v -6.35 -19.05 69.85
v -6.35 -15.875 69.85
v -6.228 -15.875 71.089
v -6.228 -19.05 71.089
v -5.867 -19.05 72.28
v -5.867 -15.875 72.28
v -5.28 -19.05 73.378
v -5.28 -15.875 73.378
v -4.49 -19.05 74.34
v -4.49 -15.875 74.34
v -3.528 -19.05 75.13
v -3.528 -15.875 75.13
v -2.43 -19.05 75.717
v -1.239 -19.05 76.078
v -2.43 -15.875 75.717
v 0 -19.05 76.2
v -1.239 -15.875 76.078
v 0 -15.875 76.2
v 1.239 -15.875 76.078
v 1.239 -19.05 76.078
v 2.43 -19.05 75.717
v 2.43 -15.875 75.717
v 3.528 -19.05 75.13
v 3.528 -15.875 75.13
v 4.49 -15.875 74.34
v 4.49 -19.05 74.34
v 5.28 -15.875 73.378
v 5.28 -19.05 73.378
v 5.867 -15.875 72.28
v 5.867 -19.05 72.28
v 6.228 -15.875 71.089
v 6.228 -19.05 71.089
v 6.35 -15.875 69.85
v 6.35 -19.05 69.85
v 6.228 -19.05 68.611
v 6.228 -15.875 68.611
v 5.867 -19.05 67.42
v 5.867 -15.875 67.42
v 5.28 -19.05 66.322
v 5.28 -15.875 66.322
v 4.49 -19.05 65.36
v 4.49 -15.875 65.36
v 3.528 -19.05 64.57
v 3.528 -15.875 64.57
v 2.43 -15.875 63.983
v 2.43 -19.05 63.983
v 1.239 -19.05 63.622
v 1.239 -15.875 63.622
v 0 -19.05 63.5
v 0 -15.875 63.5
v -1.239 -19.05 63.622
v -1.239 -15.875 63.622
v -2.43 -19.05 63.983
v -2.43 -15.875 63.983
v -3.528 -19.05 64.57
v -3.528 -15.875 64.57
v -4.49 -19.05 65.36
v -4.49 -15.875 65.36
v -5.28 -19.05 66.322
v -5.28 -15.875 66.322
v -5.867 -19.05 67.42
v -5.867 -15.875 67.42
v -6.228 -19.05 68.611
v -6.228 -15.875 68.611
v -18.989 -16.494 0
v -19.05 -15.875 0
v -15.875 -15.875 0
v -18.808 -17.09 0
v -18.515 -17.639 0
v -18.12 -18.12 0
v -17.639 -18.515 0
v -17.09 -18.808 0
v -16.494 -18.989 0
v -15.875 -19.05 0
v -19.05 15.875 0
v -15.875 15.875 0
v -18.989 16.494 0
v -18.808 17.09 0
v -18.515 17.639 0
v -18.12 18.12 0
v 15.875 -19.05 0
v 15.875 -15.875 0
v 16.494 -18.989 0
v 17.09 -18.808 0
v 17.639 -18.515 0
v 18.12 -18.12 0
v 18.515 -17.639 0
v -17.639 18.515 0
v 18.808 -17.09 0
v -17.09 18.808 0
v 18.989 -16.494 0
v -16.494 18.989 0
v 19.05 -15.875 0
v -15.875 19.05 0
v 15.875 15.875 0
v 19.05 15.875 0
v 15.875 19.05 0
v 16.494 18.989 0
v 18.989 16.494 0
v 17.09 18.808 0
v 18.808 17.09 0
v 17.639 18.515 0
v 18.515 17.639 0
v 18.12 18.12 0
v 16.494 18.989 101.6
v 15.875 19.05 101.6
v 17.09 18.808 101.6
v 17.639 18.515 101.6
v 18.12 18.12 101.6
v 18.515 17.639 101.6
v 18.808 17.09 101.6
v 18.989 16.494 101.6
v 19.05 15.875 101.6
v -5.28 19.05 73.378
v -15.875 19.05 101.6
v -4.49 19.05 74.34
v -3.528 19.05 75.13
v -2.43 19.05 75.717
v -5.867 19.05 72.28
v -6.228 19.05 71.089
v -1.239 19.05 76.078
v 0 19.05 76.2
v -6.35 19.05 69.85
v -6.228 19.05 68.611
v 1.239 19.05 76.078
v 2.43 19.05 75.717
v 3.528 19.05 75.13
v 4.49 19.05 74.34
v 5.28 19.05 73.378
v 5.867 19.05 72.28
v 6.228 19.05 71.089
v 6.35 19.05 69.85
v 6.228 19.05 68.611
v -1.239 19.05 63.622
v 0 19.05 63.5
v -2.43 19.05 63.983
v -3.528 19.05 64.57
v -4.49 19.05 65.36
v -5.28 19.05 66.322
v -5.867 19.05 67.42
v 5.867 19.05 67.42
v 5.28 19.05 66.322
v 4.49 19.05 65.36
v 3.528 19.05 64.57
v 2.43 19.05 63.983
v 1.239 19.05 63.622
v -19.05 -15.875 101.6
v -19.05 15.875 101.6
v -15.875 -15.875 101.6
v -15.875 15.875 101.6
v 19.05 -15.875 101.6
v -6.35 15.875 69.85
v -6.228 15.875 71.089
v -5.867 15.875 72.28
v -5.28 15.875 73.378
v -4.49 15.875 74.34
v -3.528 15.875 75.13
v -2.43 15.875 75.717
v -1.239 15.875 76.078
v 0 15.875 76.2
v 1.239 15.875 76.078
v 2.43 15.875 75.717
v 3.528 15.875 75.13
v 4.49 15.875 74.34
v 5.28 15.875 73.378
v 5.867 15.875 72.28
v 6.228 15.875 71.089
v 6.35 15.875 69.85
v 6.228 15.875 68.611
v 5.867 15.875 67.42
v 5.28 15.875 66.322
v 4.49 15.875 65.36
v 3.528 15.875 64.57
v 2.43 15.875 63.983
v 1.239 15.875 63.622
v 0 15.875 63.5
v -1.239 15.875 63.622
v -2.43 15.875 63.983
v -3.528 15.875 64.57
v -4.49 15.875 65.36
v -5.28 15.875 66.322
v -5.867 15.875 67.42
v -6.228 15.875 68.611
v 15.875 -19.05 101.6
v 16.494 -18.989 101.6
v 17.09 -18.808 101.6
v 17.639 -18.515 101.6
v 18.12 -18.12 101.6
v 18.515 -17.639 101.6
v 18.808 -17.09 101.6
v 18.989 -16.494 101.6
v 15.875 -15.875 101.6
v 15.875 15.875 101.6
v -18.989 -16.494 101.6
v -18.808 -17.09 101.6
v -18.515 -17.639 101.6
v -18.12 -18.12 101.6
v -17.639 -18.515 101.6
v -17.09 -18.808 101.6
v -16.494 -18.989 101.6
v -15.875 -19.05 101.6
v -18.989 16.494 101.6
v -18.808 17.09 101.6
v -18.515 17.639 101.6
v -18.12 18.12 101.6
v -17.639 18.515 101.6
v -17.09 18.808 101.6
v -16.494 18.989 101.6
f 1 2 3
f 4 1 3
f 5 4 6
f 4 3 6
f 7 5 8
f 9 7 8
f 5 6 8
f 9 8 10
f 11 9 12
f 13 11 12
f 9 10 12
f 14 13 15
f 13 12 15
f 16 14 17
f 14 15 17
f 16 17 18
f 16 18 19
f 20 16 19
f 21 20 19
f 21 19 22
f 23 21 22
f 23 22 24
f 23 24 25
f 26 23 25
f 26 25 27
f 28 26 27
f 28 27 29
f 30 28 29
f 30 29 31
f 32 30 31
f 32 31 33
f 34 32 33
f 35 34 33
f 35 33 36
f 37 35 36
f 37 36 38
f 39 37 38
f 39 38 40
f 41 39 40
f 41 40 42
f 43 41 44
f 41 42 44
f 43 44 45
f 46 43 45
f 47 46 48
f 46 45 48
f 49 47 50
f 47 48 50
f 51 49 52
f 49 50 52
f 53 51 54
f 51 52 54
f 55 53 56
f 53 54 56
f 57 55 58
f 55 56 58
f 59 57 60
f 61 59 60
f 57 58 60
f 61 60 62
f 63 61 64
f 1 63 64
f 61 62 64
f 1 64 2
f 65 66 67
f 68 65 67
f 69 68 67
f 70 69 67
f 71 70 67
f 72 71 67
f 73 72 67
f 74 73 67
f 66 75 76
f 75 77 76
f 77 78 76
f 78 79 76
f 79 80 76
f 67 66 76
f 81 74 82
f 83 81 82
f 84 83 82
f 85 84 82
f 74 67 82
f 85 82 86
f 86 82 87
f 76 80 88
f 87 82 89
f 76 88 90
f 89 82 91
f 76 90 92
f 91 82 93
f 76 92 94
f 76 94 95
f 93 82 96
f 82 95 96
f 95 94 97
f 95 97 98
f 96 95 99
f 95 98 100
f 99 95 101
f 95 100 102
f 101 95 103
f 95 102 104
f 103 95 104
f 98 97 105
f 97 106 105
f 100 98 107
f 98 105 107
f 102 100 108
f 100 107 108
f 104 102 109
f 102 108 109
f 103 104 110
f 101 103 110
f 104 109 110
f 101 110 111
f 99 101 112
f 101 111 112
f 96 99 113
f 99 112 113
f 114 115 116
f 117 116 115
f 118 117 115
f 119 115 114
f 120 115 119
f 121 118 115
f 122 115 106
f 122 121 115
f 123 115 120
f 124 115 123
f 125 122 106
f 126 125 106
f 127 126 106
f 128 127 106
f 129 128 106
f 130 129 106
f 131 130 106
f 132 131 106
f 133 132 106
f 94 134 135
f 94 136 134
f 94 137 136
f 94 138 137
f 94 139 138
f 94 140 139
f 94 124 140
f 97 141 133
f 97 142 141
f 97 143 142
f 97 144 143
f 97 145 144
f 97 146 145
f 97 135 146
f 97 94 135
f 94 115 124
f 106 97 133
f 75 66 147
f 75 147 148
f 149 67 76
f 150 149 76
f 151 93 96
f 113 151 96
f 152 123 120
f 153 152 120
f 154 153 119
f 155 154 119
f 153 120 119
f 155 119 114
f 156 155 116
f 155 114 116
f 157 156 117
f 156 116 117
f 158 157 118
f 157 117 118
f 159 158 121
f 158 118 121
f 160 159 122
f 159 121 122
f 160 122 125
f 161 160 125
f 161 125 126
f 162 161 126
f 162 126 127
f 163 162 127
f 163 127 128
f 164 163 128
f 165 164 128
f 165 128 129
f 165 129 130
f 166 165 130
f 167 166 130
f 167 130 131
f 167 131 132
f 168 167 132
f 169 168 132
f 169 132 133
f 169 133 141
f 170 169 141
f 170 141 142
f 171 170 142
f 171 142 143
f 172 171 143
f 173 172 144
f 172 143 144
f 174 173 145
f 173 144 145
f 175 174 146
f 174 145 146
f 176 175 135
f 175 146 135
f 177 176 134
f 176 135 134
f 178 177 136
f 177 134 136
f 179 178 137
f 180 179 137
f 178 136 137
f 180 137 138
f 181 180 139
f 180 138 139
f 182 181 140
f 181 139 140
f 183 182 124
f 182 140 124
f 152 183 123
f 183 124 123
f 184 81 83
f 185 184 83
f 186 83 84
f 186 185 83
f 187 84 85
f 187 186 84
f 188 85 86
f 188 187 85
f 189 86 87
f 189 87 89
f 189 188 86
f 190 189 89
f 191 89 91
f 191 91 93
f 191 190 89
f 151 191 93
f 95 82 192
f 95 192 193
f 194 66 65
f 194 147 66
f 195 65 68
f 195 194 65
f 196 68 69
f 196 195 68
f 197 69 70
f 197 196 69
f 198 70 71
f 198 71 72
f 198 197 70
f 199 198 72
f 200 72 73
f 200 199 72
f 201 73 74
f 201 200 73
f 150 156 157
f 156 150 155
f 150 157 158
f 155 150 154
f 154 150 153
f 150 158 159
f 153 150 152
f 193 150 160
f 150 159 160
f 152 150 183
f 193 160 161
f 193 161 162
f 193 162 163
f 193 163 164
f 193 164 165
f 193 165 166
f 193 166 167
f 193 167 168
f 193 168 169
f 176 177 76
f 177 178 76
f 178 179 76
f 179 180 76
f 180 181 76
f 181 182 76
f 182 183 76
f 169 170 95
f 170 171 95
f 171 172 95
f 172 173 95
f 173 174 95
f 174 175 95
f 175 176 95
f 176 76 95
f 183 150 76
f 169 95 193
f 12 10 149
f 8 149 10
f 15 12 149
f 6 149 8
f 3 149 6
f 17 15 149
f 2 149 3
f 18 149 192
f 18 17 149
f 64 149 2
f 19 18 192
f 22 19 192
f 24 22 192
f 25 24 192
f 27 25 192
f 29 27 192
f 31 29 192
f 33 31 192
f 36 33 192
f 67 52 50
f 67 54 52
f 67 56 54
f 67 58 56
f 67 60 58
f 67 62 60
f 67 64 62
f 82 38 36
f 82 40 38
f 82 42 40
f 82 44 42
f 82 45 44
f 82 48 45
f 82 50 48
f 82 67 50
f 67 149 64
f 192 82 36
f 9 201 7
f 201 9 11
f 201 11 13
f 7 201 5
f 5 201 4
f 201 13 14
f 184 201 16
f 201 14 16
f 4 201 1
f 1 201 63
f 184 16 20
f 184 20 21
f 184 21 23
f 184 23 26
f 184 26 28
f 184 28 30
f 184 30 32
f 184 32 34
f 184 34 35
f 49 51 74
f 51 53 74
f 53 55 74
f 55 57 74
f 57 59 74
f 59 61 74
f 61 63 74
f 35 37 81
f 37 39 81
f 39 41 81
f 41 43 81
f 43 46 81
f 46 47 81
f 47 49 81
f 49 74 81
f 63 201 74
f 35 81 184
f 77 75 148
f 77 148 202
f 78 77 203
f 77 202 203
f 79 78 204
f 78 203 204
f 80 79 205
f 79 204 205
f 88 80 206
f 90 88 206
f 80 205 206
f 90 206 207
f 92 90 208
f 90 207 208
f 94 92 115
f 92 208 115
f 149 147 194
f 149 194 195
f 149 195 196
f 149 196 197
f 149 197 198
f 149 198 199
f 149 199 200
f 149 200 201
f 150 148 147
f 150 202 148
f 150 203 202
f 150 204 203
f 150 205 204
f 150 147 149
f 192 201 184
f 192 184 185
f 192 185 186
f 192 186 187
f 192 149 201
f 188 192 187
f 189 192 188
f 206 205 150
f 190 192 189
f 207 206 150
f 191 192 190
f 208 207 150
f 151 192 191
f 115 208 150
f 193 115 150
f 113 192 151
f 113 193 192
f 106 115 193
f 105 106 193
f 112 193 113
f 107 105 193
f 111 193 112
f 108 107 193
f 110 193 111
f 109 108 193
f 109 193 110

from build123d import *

# Parameters (mm, degrees)
SKETCH1_W                  = 38.1
SKETCH1_H                  = 38.1
SKETCH1_W_2                = 31.75
SKETCH1_H_2                = 31.75
EXTRUDE1_DEPTH             = 101.6
FILLET1_R                  = 3.175
F_1_2_0_5_DIAMETER_HOLE1_D = 12.7


with BuildPart() as part:
    # Sketch1 → Extrude1 (new body)
    with BuildSketch(Plane.XY):
        Rectangle(SKETCH1_W, SKETCH1_H)
        Rectangle(SKETCH1_W_2, SKETCH1_H_2, mode=Mode.SUBTRACT)
    extrude(amount=EXTRUDE1_DEPTH)

    # Fillet1
    fillet1_edges = [part.edges().sort_by_distance(p)[0] for p in [
        (19.05, -19.05, 50.8),
        (-19.05, -19.05, 50.8),
        (-19.05, 19.05, 50.8),
        (19.05, 19.05, 50.8),
    ]]
    fillet(fillet1_edges, radius=FILLET1_R)

    # 1/2 (0.5) Diameter Hole1 (through all)
    with Locations(Plane.XZ.offset(19.05)):
        with Locations((0, 69.85)):
            Hole(F_1_2_0_5_DIAMETER_HOLE1_D / 2)


solid = part.part
